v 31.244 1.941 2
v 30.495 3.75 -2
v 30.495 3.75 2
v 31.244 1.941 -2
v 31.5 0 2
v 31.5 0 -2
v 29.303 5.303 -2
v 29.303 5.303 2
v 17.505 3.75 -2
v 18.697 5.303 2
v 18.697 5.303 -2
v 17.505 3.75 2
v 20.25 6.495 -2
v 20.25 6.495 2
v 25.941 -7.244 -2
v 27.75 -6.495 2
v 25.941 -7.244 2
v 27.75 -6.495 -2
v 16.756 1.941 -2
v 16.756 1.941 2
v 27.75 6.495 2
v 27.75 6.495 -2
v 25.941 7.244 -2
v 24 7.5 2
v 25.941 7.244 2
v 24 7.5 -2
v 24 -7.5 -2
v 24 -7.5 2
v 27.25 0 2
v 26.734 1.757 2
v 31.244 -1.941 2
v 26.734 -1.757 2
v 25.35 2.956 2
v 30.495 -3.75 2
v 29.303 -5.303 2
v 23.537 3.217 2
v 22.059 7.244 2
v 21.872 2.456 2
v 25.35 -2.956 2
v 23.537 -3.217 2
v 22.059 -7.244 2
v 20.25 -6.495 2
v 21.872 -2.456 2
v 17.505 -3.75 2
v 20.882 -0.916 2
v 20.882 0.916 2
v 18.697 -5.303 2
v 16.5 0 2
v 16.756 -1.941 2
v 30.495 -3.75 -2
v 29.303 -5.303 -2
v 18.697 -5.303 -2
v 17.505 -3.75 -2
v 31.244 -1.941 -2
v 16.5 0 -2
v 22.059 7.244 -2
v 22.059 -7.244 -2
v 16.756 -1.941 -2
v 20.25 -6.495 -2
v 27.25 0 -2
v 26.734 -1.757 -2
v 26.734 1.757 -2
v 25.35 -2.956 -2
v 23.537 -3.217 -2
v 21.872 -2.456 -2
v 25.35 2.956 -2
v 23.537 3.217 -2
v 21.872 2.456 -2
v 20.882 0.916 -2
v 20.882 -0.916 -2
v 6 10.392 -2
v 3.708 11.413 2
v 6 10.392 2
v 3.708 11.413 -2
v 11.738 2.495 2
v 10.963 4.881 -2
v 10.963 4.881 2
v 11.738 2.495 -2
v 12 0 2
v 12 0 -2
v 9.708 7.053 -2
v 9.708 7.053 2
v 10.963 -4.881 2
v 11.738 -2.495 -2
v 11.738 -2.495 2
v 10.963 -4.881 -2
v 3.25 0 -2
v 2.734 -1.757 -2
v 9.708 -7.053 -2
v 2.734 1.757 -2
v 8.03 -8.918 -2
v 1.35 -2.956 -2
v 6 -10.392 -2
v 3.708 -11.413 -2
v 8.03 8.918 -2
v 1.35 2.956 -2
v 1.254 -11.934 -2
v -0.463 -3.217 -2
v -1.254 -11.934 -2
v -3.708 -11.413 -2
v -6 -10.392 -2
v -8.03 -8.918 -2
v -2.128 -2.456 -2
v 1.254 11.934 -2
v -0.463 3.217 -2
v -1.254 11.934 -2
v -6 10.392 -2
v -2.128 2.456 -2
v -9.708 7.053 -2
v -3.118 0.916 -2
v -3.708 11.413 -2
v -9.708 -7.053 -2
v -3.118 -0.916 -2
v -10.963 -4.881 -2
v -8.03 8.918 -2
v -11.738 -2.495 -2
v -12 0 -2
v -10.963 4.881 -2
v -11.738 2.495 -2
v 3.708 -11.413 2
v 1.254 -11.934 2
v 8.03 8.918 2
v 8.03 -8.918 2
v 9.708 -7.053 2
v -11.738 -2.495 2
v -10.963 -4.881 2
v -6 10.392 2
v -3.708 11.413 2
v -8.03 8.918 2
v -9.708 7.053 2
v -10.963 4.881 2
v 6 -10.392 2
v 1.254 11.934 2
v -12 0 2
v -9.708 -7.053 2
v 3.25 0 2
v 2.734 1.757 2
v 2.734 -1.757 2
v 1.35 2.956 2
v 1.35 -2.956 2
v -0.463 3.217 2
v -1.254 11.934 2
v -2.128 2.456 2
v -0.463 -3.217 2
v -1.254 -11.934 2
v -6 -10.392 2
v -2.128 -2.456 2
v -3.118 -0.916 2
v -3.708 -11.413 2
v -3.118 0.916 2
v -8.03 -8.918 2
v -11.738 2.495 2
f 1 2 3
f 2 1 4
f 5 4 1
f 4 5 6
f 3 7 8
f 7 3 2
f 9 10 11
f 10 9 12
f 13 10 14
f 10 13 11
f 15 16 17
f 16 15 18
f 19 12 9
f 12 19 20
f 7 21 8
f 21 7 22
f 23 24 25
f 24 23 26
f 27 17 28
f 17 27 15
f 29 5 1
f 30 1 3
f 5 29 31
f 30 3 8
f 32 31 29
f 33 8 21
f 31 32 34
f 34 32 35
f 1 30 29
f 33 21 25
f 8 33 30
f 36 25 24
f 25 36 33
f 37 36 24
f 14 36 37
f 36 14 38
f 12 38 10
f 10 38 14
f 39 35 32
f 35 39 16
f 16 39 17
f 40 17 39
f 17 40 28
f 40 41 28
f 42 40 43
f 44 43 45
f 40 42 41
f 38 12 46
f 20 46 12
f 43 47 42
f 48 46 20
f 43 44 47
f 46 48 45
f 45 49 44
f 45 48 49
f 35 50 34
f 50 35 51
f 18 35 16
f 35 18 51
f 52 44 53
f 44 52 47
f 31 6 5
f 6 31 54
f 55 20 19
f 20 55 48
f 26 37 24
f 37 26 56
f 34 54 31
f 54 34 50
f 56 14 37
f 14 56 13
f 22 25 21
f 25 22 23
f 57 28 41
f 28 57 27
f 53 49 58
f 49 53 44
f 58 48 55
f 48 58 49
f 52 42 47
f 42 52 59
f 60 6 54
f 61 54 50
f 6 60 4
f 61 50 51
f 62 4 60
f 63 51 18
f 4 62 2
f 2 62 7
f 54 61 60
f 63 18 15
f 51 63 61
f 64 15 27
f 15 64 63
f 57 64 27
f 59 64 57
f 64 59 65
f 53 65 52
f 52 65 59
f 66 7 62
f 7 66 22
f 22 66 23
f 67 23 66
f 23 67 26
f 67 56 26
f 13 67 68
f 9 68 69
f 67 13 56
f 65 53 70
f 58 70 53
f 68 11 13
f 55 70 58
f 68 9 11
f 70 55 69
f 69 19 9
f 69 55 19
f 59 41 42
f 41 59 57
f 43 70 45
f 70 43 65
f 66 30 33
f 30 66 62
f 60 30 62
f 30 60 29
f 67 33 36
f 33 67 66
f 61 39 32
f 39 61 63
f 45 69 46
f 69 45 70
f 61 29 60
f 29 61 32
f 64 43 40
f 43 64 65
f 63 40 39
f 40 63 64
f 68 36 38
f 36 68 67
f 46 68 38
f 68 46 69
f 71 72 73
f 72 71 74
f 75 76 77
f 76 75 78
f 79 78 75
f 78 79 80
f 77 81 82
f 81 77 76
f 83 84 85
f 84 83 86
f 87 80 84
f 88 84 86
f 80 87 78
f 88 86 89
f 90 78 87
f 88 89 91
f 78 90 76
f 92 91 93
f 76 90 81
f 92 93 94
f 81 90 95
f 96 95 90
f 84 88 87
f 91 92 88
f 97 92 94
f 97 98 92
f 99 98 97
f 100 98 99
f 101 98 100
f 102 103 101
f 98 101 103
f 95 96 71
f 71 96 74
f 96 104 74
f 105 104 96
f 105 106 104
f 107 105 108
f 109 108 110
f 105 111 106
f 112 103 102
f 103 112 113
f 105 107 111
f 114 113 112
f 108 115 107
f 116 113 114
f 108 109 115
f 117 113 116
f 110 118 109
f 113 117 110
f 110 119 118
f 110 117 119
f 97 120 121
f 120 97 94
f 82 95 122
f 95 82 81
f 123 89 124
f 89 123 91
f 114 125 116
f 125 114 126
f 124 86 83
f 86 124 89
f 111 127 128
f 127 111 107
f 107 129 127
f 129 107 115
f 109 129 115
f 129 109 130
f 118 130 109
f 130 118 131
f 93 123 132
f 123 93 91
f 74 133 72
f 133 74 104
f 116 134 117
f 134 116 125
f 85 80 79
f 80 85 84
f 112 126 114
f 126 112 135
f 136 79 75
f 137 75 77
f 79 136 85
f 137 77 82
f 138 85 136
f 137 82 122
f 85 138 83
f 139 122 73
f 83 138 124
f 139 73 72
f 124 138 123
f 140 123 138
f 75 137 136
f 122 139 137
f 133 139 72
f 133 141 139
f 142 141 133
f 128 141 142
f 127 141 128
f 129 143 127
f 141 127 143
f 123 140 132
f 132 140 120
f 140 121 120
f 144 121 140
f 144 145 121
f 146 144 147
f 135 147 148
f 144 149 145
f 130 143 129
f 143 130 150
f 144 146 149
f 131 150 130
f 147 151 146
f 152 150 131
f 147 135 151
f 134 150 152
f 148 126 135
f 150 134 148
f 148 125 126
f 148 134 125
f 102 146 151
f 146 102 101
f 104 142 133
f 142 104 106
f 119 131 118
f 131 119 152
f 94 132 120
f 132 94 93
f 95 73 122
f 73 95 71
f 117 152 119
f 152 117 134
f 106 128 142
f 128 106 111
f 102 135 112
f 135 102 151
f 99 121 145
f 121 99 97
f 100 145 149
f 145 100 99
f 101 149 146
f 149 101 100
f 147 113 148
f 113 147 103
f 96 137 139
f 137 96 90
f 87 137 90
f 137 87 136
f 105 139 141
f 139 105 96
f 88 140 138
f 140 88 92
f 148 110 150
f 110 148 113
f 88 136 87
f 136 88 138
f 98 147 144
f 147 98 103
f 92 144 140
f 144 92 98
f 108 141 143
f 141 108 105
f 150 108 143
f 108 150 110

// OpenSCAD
d_small_nut = 15;
d_big_nut = 24;
h_nut = 4;

translate([d_big_nut, 0, 0])
nut_small();
nut_big();

module nut_small() {
    difference(){
cylinder(d=d_small_nut, h=h_nut, center=true);
        cylinder(h = 40, d = 6.5, center=true);
    }
    
}
module nut_big() {
    difference(){
 cylinder (d=d_big_nut, h=h_nut, center=true);
 cylinder(h = 40, d = 6.5, center=true);
        
    }
}
